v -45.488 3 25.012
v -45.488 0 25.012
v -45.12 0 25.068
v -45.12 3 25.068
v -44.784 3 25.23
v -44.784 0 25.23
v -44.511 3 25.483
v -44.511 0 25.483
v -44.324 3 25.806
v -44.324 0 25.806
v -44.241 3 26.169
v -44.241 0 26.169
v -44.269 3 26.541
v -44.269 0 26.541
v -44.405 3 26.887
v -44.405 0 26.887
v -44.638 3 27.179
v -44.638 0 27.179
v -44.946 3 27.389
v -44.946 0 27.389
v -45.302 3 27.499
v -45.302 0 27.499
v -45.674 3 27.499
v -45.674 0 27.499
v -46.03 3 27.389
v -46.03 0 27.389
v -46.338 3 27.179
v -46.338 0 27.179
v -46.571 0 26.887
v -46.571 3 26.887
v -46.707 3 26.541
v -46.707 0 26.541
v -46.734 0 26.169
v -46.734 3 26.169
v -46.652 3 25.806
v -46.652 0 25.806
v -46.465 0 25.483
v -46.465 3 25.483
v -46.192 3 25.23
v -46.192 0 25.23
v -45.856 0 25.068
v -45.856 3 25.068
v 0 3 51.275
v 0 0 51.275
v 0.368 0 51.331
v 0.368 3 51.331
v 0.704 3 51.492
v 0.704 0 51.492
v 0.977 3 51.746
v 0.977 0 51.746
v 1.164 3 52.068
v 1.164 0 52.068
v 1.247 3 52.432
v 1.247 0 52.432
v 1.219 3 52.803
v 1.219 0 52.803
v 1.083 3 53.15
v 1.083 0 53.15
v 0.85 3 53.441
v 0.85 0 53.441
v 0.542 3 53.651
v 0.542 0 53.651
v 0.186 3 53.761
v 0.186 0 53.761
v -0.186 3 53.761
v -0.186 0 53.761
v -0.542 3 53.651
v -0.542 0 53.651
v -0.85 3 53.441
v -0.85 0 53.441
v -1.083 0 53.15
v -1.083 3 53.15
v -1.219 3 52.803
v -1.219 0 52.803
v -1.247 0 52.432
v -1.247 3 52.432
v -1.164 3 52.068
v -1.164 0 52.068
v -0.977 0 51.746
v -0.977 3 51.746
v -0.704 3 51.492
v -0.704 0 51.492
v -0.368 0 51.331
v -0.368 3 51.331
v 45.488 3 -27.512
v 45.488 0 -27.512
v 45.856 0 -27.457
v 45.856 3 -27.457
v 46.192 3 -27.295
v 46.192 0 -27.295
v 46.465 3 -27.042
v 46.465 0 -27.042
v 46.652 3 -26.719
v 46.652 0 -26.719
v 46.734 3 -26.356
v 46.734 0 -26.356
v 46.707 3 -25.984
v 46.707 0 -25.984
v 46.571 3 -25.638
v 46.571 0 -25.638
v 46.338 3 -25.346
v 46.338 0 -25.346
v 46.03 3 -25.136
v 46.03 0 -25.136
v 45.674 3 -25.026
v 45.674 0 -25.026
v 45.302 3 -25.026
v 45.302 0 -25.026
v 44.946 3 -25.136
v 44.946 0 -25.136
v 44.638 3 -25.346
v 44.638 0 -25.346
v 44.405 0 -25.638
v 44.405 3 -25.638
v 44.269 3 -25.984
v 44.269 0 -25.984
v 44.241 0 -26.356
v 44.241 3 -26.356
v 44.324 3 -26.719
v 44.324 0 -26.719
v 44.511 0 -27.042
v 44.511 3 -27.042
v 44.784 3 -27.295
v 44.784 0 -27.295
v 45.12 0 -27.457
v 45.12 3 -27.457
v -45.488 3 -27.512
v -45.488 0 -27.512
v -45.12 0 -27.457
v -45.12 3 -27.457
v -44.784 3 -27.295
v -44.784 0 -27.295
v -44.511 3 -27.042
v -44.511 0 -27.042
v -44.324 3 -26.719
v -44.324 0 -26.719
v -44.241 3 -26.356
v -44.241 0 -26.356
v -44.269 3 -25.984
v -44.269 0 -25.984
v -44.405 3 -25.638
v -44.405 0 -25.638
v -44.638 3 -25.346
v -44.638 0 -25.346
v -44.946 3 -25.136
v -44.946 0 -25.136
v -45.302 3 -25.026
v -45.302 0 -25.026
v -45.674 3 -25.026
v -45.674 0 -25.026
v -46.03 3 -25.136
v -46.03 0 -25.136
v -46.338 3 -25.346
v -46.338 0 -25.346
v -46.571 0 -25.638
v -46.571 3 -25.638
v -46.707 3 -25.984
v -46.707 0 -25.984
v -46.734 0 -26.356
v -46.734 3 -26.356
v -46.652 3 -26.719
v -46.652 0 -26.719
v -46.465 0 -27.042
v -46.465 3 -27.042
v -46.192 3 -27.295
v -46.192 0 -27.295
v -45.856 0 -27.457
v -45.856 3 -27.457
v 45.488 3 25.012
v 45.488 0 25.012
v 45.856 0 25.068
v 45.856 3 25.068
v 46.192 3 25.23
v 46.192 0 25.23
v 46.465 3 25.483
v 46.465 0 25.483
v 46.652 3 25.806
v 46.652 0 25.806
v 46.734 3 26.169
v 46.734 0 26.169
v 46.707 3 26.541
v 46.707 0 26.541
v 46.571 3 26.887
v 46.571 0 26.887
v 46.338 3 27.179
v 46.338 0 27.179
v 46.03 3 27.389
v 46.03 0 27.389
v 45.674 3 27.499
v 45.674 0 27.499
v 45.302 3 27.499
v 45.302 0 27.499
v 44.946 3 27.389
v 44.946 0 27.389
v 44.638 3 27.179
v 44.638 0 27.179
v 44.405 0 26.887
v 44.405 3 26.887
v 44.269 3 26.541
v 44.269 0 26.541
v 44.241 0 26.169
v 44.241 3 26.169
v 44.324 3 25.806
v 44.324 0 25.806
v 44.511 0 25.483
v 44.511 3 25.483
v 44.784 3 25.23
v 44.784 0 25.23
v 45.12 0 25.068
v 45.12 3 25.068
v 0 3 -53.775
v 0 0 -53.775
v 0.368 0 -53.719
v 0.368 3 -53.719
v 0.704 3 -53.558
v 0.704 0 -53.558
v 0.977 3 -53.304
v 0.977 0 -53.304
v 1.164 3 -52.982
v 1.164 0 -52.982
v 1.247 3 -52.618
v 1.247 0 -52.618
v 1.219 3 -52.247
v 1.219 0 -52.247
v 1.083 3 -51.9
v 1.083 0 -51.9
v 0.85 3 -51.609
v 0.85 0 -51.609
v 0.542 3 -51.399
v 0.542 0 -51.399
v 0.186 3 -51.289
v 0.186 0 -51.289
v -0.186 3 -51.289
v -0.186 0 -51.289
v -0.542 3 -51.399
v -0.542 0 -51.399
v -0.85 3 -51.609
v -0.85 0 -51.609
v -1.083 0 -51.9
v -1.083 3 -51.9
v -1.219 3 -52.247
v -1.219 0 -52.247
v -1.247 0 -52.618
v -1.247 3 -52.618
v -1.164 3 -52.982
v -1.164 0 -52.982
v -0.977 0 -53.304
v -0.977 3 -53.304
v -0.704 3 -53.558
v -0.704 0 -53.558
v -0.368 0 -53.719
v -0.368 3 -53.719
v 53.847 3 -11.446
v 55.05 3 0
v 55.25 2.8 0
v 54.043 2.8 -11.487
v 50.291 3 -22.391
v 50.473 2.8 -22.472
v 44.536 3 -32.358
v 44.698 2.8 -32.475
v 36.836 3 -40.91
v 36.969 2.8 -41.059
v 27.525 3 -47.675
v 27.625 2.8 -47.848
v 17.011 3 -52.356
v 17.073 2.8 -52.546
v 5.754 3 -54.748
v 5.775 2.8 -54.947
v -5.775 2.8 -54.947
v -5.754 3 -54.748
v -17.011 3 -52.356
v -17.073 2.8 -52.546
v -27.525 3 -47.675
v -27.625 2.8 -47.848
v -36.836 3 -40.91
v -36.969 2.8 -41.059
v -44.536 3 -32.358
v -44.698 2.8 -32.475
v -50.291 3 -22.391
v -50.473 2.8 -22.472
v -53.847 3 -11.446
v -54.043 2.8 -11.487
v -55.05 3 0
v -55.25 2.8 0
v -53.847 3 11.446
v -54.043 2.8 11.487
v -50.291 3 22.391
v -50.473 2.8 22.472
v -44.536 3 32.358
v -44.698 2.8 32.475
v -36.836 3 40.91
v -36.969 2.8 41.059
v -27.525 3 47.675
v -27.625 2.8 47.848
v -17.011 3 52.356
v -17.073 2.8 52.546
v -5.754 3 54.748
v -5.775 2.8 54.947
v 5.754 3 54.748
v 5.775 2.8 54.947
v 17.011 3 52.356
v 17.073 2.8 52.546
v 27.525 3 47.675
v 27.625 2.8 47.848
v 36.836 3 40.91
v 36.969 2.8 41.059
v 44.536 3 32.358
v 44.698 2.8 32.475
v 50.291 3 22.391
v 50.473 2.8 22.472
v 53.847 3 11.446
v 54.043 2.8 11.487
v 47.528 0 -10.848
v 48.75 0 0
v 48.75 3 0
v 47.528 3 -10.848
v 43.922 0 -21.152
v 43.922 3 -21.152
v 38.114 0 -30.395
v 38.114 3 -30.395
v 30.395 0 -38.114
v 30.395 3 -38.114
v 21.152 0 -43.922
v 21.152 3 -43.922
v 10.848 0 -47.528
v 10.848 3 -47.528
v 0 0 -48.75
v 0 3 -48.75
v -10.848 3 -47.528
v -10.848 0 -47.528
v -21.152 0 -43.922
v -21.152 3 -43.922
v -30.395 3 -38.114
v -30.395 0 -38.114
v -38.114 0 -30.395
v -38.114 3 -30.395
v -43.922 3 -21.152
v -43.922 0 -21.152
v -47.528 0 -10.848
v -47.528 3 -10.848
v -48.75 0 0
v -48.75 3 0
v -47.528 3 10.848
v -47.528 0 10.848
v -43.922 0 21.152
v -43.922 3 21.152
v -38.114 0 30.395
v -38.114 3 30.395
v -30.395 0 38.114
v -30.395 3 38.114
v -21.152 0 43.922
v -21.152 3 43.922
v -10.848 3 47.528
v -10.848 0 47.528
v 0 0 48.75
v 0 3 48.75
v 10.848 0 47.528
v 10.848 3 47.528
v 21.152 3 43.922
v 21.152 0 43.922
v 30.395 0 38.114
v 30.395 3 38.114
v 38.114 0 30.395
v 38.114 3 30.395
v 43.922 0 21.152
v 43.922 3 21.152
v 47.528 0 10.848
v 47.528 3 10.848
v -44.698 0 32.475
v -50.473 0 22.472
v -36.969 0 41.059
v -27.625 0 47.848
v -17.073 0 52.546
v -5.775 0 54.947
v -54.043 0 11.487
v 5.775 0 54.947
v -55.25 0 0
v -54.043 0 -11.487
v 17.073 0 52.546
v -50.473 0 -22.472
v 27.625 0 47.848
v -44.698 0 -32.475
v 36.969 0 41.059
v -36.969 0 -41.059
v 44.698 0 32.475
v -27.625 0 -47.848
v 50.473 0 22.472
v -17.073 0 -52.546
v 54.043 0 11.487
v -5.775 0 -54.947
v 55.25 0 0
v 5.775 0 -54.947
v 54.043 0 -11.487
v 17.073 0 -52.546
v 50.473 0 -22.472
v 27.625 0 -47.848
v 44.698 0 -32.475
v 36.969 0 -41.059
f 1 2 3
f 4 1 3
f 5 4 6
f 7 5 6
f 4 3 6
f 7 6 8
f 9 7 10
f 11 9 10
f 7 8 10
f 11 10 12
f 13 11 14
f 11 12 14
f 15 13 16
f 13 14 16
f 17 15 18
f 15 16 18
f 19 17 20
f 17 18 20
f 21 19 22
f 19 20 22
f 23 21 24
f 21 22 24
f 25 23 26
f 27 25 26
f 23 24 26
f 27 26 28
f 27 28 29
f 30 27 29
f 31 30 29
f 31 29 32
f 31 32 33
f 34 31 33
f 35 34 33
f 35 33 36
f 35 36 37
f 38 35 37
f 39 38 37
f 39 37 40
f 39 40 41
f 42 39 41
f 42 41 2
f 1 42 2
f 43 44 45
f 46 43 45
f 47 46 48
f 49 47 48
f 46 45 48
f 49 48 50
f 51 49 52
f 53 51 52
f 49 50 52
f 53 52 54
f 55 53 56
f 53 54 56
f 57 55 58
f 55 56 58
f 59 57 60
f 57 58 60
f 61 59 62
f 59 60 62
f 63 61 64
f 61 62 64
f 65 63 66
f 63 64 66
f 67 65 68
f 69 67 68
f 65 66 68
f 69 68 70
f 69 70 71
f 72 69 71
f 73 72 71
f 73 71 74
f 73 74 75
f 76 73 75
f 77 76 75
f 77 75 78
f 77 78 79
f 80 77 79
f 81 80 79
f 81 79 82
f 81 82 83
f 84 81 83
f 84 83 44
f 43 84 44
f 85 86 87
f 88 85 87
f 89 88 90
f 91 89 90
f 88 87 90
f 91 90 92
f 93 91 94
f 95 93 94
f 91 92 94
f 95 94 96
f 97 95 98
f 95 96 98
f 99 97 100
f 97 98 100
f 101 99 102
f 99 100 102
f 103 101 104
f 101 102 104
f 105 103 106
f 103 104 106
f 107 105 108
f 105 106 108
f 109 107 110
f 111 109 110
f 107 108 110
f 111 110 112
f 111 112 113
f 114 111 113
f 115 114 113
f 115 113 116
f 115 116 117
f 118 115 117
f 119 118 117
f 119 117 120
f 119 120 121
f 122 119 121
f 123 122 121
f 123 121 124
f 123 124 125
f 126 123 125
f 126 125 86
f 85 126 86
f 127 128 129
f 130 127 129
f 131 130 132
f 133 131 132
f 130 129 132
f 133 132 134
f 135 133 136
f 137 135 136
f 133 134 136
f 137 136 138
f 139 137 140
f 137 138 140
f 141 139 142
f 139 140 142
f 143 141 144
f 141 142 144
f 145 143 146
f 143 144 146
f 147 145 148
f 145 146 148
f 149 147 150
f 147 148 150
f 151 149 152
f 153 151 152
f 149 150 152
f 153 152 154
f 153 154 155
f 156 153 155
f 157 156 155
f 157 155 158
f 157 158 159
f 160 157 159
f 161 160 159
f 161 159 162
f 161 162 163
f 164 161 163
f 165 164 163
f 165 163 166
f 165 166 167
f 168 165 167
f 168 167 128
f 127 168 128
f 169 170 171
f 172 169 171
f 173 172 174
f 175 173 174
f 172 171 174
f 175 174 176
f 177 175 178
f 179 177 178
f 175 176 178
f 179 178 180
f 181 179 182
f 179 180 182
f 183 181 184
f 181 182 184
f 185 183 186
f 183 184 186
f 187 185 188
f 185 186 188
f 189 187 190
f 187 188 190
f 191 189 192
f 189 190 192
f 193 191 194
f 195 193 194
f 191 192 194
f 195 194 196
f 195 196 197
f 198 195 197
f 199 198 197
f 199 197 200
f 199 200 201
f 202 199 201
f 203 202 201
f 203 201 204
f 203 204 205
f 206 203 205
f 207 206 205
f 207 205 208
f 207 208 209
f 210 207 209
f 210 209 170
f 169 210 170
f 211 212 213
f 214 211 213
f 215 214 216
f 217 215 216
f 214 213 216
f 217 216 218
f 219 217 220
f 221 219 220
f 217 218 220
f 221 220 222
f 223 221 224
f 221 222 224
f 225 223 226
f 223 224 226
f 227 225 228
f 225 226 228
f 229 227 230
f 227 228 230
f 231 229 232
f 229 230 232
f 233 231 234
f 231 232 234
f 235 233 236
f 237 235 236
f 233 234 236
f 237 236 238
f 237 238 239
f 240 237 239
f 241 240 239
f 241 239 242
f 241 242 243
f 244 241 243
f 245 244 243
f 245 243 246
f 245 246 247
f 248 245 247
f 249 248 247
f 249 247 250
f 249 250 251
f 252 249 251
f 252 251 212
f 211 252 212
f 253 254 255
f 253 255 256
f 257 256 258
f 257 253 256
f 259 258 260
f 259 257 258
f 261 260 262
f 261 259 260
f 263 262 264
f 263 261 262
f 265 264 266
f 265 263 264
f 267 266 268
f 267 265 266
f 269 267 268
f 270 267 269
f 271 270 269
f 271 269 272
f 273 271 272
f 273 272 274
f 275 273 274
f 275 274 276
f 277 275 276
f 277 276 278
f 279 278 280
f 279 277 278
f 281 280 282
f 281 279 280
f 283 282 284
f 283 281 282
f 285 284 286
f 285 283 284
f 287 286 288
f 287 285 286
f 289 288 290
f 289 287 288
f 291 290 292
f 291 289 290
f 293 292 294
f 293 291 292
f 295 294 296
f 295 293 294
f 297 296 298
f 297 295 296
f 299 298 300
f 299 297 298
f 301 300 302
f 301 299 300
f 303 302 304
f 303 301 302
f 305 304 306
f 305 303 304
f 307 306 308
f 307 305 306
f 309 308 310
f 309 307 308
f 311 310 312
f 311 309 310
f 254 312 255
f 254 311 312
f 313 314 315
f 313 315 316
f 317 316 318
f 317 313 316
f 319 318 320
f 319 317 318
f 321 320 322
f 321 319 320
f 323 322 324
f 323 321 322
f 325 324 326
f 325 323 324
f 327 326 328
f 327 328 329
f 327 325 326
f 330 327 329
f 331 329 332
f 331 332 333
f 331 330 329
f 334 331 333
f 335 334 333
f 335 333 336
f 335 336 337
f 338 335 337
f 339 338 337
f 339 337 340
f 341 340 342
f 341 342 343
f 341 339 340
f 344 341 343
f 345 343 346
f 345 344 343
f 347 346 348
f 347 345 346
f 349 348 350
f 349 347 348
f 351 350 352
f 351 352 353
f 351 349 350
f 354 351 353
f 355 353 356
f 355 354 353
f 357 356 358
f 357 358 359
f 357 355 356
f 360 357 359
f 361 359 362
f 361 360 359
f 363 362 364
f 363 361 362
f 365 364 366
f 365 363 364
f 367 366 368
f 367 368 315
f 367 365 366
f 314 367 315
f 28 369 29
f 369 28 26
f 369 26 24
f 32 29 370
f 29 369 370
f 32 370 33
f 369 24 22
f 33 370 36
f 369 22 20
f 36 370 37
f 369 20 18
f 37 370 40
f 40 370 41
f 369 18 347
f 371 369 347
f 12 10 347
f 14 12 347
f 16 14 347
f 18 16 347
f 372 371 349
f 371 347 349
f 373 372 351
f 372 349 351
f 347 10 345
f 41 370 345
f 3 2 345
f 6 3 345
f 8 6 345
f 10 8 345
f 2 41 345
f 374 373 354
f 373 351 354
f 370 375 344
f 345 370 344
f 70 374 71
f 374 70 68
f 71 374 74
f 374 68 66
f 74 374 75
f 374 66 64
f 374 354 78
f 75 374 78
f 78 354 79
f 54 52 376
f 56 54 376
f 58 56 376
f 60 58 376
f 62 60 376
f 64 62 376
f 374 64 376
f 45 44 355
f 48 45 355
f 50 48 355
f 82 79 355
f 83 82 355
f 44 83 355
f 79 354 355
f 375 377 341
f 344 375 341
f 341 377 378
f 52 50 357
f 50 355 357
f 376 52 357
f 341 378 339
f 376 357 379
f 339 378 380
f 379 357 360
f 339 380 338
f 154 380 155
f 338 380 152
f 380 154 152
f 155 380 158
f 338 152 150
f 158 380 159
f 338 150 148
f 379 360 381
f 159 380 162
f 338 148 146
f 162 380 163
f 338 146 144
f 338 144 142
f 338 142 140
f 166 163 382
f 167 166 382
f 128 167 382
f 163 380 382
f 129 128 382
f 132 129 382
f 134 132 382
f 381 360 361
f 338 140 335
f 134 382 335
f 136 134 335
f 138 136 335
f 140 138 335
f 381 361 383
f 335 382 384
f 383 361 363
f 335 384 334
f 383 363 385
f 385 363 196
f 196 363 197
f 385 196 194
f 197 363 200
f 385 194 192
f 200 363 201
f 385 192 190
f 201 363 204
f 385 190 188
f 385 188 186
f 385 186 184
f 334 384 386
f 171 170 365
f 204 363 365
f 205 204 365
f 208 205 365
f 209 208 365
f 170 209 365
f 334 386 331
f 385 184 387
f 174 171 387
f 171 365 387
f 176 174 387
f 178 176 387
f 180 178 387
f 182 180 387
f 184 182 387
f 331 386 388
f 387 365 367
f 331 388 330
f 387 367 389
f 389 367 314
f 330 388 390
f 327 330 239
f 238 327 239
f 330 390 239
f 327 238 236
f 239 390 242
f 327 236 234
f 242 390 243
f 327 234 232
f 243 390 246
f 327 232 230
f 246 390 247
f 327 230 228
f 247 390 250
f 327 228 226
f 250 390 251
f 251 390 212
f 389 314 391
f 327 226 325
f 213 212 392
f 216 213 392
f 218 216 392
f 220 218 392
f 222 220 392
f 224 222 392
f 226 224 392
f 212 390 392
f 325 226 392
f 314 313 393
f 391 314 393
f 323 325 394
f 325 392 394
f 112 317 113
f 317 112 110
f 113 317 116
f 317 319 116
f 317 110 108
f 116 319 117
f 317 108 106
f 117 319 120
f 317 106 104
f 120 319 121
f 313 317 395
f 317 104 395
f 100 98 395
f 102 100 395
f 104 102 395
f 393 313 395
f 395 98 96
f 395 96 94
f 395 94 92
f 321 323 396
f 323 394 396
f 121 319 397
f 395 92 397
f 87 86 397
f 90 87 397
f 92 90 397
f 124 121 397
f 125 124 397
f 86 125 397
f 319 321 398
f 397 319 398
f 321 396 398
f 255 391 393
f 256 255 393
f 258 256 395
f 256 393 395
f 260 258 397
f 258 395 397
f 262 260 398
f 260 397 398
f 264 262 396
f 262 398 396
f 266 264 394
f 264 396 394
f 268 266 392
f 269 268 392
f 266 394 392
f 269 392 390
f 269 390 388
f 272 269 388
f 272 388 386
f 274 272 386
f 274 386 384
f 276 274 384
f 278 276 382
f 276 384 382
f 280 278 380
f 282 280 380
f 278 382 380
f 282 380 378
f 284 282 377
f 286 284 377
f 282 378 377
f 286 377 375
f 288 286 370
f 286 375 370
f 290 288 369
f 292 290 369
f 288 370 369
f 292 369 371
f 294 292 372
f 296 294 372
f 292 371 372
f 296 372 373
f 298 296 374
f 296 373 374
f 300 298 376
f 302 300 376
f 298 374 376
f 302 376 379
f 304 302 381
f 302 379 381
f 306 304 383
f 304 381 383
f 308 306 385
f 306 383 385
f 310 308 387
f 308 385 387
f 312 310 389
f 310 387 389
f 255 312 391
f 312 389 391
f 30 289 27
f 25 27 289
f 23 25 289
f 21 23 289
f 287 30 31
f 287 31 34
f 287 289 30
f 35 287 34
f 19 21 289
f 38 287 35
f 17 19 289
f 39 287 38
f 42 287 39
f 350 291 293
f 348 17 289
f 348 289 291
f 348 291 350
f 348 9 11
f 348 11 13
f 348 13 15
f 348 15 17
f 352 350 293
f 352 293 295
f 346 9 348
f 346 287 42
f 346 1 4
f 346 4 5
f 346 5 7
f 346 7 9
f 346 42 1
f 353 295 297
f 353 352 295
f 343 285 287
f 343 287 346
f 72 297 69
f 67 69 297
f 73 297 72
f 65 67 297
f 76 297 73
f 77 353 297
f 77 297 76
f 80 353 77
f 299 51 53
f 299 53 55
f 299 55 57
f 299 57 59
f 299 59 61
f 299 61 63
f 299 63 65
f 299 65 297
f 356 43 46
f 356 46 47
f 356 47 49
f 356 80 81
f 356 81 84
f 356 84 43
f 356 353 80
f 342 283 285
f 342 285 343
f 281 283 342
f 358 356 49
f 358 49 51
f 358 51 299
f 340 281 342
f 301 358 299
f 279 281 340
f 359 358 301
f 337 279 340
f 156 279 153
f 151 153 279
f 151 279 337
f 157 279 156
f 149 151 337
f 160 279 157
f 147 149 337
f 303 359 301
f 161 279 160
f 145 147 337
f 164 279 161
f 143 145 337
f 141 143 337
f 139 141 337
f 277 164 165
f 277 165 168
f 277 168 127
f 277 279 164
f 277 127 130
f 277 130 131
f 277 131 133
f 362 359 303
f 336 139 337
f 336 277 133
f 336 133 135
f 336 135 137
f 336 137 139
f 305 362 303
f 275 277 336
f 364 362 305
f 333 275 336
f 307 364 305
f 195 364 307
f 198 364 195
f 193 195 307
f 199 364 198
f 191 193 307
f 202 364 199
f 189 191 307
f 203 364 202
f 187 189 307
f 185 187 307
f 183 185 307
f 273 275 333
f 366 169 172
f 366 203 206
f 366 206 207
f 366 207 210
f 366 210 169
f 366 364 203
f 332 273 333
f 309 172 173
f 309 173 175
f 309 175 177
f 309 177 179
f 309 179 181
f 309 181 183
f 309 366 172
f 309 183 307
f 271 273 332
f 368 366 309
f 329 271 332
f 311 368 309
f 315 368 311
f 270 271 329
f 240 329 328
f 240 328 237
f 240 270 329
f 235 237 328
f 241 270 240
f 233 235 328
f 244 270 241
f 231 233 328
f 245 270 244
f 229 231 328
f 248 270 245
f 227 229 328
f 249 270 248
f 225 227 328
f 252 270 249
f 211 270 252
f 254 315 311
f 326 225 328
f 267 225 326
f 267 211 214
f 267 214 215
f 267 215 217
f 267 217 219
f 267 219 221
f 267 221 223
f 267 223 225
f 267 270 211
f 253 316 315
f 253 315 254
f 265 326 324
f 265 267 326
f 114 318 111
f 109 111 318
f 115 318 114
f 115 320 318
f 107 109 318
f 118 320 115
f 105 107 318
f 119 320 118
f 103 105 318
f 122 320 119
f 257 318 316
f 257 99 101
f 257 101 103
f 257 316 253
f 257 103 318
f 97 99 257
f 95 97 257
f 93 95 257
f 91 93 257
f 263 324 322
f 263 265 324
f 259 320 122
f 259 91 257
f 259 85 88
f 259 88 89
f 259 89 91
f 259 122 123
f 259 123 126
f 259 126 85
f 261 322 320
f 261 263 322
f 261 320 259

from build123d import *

# Parameters (mm, degrees)
SKETCH_1_R      = 55.25
SKETCH_1_R_2    = 48.75
EXTRUDE_1_DEPTH = 3
M3X0_5_1_D      = 2.5
CHAMFER_1_SIZE  = 0.2


with BuildPart() as part:
    # 草图1 → 凸台-拉伸1 (new body)
    with BuildSketch(Plane(origin=(0, 0, 0), x_dir=(1, 0, 0), z_dir=(0, 1, 0))):
        Circle(SKETCH_1_R)
        Circle(SKETCH_1_R_2, mode=Mode.SUBTRACT)
    extrude(amount=EXTRUDE_1_DEPTH)

    # M3x0.5 螺纹孔1 (through all)
    with Locations(Plane(origin=(0, 3, -52.525), x_dir=(0, 0, 1), z_dir=(0, 1, 0))):
        with Locations((0, 0), (26.2625, 45.487984334), (78.7875, 45.487984334), (105.05, 0), (78.7875, -45.487984334), (26.2625, -45.487984334)):
            Hole(M3X0_5_1_D / 2)

    # 倒角1
    chamfer_1_edges = [part.edges().sort_by_distance(p)[0] for p in [
        (-55.25, 3, 0),
    ]]
    chamfer(chamfer_1_edges, length=CHAMFER_1_SIZE)


solid = part.part
